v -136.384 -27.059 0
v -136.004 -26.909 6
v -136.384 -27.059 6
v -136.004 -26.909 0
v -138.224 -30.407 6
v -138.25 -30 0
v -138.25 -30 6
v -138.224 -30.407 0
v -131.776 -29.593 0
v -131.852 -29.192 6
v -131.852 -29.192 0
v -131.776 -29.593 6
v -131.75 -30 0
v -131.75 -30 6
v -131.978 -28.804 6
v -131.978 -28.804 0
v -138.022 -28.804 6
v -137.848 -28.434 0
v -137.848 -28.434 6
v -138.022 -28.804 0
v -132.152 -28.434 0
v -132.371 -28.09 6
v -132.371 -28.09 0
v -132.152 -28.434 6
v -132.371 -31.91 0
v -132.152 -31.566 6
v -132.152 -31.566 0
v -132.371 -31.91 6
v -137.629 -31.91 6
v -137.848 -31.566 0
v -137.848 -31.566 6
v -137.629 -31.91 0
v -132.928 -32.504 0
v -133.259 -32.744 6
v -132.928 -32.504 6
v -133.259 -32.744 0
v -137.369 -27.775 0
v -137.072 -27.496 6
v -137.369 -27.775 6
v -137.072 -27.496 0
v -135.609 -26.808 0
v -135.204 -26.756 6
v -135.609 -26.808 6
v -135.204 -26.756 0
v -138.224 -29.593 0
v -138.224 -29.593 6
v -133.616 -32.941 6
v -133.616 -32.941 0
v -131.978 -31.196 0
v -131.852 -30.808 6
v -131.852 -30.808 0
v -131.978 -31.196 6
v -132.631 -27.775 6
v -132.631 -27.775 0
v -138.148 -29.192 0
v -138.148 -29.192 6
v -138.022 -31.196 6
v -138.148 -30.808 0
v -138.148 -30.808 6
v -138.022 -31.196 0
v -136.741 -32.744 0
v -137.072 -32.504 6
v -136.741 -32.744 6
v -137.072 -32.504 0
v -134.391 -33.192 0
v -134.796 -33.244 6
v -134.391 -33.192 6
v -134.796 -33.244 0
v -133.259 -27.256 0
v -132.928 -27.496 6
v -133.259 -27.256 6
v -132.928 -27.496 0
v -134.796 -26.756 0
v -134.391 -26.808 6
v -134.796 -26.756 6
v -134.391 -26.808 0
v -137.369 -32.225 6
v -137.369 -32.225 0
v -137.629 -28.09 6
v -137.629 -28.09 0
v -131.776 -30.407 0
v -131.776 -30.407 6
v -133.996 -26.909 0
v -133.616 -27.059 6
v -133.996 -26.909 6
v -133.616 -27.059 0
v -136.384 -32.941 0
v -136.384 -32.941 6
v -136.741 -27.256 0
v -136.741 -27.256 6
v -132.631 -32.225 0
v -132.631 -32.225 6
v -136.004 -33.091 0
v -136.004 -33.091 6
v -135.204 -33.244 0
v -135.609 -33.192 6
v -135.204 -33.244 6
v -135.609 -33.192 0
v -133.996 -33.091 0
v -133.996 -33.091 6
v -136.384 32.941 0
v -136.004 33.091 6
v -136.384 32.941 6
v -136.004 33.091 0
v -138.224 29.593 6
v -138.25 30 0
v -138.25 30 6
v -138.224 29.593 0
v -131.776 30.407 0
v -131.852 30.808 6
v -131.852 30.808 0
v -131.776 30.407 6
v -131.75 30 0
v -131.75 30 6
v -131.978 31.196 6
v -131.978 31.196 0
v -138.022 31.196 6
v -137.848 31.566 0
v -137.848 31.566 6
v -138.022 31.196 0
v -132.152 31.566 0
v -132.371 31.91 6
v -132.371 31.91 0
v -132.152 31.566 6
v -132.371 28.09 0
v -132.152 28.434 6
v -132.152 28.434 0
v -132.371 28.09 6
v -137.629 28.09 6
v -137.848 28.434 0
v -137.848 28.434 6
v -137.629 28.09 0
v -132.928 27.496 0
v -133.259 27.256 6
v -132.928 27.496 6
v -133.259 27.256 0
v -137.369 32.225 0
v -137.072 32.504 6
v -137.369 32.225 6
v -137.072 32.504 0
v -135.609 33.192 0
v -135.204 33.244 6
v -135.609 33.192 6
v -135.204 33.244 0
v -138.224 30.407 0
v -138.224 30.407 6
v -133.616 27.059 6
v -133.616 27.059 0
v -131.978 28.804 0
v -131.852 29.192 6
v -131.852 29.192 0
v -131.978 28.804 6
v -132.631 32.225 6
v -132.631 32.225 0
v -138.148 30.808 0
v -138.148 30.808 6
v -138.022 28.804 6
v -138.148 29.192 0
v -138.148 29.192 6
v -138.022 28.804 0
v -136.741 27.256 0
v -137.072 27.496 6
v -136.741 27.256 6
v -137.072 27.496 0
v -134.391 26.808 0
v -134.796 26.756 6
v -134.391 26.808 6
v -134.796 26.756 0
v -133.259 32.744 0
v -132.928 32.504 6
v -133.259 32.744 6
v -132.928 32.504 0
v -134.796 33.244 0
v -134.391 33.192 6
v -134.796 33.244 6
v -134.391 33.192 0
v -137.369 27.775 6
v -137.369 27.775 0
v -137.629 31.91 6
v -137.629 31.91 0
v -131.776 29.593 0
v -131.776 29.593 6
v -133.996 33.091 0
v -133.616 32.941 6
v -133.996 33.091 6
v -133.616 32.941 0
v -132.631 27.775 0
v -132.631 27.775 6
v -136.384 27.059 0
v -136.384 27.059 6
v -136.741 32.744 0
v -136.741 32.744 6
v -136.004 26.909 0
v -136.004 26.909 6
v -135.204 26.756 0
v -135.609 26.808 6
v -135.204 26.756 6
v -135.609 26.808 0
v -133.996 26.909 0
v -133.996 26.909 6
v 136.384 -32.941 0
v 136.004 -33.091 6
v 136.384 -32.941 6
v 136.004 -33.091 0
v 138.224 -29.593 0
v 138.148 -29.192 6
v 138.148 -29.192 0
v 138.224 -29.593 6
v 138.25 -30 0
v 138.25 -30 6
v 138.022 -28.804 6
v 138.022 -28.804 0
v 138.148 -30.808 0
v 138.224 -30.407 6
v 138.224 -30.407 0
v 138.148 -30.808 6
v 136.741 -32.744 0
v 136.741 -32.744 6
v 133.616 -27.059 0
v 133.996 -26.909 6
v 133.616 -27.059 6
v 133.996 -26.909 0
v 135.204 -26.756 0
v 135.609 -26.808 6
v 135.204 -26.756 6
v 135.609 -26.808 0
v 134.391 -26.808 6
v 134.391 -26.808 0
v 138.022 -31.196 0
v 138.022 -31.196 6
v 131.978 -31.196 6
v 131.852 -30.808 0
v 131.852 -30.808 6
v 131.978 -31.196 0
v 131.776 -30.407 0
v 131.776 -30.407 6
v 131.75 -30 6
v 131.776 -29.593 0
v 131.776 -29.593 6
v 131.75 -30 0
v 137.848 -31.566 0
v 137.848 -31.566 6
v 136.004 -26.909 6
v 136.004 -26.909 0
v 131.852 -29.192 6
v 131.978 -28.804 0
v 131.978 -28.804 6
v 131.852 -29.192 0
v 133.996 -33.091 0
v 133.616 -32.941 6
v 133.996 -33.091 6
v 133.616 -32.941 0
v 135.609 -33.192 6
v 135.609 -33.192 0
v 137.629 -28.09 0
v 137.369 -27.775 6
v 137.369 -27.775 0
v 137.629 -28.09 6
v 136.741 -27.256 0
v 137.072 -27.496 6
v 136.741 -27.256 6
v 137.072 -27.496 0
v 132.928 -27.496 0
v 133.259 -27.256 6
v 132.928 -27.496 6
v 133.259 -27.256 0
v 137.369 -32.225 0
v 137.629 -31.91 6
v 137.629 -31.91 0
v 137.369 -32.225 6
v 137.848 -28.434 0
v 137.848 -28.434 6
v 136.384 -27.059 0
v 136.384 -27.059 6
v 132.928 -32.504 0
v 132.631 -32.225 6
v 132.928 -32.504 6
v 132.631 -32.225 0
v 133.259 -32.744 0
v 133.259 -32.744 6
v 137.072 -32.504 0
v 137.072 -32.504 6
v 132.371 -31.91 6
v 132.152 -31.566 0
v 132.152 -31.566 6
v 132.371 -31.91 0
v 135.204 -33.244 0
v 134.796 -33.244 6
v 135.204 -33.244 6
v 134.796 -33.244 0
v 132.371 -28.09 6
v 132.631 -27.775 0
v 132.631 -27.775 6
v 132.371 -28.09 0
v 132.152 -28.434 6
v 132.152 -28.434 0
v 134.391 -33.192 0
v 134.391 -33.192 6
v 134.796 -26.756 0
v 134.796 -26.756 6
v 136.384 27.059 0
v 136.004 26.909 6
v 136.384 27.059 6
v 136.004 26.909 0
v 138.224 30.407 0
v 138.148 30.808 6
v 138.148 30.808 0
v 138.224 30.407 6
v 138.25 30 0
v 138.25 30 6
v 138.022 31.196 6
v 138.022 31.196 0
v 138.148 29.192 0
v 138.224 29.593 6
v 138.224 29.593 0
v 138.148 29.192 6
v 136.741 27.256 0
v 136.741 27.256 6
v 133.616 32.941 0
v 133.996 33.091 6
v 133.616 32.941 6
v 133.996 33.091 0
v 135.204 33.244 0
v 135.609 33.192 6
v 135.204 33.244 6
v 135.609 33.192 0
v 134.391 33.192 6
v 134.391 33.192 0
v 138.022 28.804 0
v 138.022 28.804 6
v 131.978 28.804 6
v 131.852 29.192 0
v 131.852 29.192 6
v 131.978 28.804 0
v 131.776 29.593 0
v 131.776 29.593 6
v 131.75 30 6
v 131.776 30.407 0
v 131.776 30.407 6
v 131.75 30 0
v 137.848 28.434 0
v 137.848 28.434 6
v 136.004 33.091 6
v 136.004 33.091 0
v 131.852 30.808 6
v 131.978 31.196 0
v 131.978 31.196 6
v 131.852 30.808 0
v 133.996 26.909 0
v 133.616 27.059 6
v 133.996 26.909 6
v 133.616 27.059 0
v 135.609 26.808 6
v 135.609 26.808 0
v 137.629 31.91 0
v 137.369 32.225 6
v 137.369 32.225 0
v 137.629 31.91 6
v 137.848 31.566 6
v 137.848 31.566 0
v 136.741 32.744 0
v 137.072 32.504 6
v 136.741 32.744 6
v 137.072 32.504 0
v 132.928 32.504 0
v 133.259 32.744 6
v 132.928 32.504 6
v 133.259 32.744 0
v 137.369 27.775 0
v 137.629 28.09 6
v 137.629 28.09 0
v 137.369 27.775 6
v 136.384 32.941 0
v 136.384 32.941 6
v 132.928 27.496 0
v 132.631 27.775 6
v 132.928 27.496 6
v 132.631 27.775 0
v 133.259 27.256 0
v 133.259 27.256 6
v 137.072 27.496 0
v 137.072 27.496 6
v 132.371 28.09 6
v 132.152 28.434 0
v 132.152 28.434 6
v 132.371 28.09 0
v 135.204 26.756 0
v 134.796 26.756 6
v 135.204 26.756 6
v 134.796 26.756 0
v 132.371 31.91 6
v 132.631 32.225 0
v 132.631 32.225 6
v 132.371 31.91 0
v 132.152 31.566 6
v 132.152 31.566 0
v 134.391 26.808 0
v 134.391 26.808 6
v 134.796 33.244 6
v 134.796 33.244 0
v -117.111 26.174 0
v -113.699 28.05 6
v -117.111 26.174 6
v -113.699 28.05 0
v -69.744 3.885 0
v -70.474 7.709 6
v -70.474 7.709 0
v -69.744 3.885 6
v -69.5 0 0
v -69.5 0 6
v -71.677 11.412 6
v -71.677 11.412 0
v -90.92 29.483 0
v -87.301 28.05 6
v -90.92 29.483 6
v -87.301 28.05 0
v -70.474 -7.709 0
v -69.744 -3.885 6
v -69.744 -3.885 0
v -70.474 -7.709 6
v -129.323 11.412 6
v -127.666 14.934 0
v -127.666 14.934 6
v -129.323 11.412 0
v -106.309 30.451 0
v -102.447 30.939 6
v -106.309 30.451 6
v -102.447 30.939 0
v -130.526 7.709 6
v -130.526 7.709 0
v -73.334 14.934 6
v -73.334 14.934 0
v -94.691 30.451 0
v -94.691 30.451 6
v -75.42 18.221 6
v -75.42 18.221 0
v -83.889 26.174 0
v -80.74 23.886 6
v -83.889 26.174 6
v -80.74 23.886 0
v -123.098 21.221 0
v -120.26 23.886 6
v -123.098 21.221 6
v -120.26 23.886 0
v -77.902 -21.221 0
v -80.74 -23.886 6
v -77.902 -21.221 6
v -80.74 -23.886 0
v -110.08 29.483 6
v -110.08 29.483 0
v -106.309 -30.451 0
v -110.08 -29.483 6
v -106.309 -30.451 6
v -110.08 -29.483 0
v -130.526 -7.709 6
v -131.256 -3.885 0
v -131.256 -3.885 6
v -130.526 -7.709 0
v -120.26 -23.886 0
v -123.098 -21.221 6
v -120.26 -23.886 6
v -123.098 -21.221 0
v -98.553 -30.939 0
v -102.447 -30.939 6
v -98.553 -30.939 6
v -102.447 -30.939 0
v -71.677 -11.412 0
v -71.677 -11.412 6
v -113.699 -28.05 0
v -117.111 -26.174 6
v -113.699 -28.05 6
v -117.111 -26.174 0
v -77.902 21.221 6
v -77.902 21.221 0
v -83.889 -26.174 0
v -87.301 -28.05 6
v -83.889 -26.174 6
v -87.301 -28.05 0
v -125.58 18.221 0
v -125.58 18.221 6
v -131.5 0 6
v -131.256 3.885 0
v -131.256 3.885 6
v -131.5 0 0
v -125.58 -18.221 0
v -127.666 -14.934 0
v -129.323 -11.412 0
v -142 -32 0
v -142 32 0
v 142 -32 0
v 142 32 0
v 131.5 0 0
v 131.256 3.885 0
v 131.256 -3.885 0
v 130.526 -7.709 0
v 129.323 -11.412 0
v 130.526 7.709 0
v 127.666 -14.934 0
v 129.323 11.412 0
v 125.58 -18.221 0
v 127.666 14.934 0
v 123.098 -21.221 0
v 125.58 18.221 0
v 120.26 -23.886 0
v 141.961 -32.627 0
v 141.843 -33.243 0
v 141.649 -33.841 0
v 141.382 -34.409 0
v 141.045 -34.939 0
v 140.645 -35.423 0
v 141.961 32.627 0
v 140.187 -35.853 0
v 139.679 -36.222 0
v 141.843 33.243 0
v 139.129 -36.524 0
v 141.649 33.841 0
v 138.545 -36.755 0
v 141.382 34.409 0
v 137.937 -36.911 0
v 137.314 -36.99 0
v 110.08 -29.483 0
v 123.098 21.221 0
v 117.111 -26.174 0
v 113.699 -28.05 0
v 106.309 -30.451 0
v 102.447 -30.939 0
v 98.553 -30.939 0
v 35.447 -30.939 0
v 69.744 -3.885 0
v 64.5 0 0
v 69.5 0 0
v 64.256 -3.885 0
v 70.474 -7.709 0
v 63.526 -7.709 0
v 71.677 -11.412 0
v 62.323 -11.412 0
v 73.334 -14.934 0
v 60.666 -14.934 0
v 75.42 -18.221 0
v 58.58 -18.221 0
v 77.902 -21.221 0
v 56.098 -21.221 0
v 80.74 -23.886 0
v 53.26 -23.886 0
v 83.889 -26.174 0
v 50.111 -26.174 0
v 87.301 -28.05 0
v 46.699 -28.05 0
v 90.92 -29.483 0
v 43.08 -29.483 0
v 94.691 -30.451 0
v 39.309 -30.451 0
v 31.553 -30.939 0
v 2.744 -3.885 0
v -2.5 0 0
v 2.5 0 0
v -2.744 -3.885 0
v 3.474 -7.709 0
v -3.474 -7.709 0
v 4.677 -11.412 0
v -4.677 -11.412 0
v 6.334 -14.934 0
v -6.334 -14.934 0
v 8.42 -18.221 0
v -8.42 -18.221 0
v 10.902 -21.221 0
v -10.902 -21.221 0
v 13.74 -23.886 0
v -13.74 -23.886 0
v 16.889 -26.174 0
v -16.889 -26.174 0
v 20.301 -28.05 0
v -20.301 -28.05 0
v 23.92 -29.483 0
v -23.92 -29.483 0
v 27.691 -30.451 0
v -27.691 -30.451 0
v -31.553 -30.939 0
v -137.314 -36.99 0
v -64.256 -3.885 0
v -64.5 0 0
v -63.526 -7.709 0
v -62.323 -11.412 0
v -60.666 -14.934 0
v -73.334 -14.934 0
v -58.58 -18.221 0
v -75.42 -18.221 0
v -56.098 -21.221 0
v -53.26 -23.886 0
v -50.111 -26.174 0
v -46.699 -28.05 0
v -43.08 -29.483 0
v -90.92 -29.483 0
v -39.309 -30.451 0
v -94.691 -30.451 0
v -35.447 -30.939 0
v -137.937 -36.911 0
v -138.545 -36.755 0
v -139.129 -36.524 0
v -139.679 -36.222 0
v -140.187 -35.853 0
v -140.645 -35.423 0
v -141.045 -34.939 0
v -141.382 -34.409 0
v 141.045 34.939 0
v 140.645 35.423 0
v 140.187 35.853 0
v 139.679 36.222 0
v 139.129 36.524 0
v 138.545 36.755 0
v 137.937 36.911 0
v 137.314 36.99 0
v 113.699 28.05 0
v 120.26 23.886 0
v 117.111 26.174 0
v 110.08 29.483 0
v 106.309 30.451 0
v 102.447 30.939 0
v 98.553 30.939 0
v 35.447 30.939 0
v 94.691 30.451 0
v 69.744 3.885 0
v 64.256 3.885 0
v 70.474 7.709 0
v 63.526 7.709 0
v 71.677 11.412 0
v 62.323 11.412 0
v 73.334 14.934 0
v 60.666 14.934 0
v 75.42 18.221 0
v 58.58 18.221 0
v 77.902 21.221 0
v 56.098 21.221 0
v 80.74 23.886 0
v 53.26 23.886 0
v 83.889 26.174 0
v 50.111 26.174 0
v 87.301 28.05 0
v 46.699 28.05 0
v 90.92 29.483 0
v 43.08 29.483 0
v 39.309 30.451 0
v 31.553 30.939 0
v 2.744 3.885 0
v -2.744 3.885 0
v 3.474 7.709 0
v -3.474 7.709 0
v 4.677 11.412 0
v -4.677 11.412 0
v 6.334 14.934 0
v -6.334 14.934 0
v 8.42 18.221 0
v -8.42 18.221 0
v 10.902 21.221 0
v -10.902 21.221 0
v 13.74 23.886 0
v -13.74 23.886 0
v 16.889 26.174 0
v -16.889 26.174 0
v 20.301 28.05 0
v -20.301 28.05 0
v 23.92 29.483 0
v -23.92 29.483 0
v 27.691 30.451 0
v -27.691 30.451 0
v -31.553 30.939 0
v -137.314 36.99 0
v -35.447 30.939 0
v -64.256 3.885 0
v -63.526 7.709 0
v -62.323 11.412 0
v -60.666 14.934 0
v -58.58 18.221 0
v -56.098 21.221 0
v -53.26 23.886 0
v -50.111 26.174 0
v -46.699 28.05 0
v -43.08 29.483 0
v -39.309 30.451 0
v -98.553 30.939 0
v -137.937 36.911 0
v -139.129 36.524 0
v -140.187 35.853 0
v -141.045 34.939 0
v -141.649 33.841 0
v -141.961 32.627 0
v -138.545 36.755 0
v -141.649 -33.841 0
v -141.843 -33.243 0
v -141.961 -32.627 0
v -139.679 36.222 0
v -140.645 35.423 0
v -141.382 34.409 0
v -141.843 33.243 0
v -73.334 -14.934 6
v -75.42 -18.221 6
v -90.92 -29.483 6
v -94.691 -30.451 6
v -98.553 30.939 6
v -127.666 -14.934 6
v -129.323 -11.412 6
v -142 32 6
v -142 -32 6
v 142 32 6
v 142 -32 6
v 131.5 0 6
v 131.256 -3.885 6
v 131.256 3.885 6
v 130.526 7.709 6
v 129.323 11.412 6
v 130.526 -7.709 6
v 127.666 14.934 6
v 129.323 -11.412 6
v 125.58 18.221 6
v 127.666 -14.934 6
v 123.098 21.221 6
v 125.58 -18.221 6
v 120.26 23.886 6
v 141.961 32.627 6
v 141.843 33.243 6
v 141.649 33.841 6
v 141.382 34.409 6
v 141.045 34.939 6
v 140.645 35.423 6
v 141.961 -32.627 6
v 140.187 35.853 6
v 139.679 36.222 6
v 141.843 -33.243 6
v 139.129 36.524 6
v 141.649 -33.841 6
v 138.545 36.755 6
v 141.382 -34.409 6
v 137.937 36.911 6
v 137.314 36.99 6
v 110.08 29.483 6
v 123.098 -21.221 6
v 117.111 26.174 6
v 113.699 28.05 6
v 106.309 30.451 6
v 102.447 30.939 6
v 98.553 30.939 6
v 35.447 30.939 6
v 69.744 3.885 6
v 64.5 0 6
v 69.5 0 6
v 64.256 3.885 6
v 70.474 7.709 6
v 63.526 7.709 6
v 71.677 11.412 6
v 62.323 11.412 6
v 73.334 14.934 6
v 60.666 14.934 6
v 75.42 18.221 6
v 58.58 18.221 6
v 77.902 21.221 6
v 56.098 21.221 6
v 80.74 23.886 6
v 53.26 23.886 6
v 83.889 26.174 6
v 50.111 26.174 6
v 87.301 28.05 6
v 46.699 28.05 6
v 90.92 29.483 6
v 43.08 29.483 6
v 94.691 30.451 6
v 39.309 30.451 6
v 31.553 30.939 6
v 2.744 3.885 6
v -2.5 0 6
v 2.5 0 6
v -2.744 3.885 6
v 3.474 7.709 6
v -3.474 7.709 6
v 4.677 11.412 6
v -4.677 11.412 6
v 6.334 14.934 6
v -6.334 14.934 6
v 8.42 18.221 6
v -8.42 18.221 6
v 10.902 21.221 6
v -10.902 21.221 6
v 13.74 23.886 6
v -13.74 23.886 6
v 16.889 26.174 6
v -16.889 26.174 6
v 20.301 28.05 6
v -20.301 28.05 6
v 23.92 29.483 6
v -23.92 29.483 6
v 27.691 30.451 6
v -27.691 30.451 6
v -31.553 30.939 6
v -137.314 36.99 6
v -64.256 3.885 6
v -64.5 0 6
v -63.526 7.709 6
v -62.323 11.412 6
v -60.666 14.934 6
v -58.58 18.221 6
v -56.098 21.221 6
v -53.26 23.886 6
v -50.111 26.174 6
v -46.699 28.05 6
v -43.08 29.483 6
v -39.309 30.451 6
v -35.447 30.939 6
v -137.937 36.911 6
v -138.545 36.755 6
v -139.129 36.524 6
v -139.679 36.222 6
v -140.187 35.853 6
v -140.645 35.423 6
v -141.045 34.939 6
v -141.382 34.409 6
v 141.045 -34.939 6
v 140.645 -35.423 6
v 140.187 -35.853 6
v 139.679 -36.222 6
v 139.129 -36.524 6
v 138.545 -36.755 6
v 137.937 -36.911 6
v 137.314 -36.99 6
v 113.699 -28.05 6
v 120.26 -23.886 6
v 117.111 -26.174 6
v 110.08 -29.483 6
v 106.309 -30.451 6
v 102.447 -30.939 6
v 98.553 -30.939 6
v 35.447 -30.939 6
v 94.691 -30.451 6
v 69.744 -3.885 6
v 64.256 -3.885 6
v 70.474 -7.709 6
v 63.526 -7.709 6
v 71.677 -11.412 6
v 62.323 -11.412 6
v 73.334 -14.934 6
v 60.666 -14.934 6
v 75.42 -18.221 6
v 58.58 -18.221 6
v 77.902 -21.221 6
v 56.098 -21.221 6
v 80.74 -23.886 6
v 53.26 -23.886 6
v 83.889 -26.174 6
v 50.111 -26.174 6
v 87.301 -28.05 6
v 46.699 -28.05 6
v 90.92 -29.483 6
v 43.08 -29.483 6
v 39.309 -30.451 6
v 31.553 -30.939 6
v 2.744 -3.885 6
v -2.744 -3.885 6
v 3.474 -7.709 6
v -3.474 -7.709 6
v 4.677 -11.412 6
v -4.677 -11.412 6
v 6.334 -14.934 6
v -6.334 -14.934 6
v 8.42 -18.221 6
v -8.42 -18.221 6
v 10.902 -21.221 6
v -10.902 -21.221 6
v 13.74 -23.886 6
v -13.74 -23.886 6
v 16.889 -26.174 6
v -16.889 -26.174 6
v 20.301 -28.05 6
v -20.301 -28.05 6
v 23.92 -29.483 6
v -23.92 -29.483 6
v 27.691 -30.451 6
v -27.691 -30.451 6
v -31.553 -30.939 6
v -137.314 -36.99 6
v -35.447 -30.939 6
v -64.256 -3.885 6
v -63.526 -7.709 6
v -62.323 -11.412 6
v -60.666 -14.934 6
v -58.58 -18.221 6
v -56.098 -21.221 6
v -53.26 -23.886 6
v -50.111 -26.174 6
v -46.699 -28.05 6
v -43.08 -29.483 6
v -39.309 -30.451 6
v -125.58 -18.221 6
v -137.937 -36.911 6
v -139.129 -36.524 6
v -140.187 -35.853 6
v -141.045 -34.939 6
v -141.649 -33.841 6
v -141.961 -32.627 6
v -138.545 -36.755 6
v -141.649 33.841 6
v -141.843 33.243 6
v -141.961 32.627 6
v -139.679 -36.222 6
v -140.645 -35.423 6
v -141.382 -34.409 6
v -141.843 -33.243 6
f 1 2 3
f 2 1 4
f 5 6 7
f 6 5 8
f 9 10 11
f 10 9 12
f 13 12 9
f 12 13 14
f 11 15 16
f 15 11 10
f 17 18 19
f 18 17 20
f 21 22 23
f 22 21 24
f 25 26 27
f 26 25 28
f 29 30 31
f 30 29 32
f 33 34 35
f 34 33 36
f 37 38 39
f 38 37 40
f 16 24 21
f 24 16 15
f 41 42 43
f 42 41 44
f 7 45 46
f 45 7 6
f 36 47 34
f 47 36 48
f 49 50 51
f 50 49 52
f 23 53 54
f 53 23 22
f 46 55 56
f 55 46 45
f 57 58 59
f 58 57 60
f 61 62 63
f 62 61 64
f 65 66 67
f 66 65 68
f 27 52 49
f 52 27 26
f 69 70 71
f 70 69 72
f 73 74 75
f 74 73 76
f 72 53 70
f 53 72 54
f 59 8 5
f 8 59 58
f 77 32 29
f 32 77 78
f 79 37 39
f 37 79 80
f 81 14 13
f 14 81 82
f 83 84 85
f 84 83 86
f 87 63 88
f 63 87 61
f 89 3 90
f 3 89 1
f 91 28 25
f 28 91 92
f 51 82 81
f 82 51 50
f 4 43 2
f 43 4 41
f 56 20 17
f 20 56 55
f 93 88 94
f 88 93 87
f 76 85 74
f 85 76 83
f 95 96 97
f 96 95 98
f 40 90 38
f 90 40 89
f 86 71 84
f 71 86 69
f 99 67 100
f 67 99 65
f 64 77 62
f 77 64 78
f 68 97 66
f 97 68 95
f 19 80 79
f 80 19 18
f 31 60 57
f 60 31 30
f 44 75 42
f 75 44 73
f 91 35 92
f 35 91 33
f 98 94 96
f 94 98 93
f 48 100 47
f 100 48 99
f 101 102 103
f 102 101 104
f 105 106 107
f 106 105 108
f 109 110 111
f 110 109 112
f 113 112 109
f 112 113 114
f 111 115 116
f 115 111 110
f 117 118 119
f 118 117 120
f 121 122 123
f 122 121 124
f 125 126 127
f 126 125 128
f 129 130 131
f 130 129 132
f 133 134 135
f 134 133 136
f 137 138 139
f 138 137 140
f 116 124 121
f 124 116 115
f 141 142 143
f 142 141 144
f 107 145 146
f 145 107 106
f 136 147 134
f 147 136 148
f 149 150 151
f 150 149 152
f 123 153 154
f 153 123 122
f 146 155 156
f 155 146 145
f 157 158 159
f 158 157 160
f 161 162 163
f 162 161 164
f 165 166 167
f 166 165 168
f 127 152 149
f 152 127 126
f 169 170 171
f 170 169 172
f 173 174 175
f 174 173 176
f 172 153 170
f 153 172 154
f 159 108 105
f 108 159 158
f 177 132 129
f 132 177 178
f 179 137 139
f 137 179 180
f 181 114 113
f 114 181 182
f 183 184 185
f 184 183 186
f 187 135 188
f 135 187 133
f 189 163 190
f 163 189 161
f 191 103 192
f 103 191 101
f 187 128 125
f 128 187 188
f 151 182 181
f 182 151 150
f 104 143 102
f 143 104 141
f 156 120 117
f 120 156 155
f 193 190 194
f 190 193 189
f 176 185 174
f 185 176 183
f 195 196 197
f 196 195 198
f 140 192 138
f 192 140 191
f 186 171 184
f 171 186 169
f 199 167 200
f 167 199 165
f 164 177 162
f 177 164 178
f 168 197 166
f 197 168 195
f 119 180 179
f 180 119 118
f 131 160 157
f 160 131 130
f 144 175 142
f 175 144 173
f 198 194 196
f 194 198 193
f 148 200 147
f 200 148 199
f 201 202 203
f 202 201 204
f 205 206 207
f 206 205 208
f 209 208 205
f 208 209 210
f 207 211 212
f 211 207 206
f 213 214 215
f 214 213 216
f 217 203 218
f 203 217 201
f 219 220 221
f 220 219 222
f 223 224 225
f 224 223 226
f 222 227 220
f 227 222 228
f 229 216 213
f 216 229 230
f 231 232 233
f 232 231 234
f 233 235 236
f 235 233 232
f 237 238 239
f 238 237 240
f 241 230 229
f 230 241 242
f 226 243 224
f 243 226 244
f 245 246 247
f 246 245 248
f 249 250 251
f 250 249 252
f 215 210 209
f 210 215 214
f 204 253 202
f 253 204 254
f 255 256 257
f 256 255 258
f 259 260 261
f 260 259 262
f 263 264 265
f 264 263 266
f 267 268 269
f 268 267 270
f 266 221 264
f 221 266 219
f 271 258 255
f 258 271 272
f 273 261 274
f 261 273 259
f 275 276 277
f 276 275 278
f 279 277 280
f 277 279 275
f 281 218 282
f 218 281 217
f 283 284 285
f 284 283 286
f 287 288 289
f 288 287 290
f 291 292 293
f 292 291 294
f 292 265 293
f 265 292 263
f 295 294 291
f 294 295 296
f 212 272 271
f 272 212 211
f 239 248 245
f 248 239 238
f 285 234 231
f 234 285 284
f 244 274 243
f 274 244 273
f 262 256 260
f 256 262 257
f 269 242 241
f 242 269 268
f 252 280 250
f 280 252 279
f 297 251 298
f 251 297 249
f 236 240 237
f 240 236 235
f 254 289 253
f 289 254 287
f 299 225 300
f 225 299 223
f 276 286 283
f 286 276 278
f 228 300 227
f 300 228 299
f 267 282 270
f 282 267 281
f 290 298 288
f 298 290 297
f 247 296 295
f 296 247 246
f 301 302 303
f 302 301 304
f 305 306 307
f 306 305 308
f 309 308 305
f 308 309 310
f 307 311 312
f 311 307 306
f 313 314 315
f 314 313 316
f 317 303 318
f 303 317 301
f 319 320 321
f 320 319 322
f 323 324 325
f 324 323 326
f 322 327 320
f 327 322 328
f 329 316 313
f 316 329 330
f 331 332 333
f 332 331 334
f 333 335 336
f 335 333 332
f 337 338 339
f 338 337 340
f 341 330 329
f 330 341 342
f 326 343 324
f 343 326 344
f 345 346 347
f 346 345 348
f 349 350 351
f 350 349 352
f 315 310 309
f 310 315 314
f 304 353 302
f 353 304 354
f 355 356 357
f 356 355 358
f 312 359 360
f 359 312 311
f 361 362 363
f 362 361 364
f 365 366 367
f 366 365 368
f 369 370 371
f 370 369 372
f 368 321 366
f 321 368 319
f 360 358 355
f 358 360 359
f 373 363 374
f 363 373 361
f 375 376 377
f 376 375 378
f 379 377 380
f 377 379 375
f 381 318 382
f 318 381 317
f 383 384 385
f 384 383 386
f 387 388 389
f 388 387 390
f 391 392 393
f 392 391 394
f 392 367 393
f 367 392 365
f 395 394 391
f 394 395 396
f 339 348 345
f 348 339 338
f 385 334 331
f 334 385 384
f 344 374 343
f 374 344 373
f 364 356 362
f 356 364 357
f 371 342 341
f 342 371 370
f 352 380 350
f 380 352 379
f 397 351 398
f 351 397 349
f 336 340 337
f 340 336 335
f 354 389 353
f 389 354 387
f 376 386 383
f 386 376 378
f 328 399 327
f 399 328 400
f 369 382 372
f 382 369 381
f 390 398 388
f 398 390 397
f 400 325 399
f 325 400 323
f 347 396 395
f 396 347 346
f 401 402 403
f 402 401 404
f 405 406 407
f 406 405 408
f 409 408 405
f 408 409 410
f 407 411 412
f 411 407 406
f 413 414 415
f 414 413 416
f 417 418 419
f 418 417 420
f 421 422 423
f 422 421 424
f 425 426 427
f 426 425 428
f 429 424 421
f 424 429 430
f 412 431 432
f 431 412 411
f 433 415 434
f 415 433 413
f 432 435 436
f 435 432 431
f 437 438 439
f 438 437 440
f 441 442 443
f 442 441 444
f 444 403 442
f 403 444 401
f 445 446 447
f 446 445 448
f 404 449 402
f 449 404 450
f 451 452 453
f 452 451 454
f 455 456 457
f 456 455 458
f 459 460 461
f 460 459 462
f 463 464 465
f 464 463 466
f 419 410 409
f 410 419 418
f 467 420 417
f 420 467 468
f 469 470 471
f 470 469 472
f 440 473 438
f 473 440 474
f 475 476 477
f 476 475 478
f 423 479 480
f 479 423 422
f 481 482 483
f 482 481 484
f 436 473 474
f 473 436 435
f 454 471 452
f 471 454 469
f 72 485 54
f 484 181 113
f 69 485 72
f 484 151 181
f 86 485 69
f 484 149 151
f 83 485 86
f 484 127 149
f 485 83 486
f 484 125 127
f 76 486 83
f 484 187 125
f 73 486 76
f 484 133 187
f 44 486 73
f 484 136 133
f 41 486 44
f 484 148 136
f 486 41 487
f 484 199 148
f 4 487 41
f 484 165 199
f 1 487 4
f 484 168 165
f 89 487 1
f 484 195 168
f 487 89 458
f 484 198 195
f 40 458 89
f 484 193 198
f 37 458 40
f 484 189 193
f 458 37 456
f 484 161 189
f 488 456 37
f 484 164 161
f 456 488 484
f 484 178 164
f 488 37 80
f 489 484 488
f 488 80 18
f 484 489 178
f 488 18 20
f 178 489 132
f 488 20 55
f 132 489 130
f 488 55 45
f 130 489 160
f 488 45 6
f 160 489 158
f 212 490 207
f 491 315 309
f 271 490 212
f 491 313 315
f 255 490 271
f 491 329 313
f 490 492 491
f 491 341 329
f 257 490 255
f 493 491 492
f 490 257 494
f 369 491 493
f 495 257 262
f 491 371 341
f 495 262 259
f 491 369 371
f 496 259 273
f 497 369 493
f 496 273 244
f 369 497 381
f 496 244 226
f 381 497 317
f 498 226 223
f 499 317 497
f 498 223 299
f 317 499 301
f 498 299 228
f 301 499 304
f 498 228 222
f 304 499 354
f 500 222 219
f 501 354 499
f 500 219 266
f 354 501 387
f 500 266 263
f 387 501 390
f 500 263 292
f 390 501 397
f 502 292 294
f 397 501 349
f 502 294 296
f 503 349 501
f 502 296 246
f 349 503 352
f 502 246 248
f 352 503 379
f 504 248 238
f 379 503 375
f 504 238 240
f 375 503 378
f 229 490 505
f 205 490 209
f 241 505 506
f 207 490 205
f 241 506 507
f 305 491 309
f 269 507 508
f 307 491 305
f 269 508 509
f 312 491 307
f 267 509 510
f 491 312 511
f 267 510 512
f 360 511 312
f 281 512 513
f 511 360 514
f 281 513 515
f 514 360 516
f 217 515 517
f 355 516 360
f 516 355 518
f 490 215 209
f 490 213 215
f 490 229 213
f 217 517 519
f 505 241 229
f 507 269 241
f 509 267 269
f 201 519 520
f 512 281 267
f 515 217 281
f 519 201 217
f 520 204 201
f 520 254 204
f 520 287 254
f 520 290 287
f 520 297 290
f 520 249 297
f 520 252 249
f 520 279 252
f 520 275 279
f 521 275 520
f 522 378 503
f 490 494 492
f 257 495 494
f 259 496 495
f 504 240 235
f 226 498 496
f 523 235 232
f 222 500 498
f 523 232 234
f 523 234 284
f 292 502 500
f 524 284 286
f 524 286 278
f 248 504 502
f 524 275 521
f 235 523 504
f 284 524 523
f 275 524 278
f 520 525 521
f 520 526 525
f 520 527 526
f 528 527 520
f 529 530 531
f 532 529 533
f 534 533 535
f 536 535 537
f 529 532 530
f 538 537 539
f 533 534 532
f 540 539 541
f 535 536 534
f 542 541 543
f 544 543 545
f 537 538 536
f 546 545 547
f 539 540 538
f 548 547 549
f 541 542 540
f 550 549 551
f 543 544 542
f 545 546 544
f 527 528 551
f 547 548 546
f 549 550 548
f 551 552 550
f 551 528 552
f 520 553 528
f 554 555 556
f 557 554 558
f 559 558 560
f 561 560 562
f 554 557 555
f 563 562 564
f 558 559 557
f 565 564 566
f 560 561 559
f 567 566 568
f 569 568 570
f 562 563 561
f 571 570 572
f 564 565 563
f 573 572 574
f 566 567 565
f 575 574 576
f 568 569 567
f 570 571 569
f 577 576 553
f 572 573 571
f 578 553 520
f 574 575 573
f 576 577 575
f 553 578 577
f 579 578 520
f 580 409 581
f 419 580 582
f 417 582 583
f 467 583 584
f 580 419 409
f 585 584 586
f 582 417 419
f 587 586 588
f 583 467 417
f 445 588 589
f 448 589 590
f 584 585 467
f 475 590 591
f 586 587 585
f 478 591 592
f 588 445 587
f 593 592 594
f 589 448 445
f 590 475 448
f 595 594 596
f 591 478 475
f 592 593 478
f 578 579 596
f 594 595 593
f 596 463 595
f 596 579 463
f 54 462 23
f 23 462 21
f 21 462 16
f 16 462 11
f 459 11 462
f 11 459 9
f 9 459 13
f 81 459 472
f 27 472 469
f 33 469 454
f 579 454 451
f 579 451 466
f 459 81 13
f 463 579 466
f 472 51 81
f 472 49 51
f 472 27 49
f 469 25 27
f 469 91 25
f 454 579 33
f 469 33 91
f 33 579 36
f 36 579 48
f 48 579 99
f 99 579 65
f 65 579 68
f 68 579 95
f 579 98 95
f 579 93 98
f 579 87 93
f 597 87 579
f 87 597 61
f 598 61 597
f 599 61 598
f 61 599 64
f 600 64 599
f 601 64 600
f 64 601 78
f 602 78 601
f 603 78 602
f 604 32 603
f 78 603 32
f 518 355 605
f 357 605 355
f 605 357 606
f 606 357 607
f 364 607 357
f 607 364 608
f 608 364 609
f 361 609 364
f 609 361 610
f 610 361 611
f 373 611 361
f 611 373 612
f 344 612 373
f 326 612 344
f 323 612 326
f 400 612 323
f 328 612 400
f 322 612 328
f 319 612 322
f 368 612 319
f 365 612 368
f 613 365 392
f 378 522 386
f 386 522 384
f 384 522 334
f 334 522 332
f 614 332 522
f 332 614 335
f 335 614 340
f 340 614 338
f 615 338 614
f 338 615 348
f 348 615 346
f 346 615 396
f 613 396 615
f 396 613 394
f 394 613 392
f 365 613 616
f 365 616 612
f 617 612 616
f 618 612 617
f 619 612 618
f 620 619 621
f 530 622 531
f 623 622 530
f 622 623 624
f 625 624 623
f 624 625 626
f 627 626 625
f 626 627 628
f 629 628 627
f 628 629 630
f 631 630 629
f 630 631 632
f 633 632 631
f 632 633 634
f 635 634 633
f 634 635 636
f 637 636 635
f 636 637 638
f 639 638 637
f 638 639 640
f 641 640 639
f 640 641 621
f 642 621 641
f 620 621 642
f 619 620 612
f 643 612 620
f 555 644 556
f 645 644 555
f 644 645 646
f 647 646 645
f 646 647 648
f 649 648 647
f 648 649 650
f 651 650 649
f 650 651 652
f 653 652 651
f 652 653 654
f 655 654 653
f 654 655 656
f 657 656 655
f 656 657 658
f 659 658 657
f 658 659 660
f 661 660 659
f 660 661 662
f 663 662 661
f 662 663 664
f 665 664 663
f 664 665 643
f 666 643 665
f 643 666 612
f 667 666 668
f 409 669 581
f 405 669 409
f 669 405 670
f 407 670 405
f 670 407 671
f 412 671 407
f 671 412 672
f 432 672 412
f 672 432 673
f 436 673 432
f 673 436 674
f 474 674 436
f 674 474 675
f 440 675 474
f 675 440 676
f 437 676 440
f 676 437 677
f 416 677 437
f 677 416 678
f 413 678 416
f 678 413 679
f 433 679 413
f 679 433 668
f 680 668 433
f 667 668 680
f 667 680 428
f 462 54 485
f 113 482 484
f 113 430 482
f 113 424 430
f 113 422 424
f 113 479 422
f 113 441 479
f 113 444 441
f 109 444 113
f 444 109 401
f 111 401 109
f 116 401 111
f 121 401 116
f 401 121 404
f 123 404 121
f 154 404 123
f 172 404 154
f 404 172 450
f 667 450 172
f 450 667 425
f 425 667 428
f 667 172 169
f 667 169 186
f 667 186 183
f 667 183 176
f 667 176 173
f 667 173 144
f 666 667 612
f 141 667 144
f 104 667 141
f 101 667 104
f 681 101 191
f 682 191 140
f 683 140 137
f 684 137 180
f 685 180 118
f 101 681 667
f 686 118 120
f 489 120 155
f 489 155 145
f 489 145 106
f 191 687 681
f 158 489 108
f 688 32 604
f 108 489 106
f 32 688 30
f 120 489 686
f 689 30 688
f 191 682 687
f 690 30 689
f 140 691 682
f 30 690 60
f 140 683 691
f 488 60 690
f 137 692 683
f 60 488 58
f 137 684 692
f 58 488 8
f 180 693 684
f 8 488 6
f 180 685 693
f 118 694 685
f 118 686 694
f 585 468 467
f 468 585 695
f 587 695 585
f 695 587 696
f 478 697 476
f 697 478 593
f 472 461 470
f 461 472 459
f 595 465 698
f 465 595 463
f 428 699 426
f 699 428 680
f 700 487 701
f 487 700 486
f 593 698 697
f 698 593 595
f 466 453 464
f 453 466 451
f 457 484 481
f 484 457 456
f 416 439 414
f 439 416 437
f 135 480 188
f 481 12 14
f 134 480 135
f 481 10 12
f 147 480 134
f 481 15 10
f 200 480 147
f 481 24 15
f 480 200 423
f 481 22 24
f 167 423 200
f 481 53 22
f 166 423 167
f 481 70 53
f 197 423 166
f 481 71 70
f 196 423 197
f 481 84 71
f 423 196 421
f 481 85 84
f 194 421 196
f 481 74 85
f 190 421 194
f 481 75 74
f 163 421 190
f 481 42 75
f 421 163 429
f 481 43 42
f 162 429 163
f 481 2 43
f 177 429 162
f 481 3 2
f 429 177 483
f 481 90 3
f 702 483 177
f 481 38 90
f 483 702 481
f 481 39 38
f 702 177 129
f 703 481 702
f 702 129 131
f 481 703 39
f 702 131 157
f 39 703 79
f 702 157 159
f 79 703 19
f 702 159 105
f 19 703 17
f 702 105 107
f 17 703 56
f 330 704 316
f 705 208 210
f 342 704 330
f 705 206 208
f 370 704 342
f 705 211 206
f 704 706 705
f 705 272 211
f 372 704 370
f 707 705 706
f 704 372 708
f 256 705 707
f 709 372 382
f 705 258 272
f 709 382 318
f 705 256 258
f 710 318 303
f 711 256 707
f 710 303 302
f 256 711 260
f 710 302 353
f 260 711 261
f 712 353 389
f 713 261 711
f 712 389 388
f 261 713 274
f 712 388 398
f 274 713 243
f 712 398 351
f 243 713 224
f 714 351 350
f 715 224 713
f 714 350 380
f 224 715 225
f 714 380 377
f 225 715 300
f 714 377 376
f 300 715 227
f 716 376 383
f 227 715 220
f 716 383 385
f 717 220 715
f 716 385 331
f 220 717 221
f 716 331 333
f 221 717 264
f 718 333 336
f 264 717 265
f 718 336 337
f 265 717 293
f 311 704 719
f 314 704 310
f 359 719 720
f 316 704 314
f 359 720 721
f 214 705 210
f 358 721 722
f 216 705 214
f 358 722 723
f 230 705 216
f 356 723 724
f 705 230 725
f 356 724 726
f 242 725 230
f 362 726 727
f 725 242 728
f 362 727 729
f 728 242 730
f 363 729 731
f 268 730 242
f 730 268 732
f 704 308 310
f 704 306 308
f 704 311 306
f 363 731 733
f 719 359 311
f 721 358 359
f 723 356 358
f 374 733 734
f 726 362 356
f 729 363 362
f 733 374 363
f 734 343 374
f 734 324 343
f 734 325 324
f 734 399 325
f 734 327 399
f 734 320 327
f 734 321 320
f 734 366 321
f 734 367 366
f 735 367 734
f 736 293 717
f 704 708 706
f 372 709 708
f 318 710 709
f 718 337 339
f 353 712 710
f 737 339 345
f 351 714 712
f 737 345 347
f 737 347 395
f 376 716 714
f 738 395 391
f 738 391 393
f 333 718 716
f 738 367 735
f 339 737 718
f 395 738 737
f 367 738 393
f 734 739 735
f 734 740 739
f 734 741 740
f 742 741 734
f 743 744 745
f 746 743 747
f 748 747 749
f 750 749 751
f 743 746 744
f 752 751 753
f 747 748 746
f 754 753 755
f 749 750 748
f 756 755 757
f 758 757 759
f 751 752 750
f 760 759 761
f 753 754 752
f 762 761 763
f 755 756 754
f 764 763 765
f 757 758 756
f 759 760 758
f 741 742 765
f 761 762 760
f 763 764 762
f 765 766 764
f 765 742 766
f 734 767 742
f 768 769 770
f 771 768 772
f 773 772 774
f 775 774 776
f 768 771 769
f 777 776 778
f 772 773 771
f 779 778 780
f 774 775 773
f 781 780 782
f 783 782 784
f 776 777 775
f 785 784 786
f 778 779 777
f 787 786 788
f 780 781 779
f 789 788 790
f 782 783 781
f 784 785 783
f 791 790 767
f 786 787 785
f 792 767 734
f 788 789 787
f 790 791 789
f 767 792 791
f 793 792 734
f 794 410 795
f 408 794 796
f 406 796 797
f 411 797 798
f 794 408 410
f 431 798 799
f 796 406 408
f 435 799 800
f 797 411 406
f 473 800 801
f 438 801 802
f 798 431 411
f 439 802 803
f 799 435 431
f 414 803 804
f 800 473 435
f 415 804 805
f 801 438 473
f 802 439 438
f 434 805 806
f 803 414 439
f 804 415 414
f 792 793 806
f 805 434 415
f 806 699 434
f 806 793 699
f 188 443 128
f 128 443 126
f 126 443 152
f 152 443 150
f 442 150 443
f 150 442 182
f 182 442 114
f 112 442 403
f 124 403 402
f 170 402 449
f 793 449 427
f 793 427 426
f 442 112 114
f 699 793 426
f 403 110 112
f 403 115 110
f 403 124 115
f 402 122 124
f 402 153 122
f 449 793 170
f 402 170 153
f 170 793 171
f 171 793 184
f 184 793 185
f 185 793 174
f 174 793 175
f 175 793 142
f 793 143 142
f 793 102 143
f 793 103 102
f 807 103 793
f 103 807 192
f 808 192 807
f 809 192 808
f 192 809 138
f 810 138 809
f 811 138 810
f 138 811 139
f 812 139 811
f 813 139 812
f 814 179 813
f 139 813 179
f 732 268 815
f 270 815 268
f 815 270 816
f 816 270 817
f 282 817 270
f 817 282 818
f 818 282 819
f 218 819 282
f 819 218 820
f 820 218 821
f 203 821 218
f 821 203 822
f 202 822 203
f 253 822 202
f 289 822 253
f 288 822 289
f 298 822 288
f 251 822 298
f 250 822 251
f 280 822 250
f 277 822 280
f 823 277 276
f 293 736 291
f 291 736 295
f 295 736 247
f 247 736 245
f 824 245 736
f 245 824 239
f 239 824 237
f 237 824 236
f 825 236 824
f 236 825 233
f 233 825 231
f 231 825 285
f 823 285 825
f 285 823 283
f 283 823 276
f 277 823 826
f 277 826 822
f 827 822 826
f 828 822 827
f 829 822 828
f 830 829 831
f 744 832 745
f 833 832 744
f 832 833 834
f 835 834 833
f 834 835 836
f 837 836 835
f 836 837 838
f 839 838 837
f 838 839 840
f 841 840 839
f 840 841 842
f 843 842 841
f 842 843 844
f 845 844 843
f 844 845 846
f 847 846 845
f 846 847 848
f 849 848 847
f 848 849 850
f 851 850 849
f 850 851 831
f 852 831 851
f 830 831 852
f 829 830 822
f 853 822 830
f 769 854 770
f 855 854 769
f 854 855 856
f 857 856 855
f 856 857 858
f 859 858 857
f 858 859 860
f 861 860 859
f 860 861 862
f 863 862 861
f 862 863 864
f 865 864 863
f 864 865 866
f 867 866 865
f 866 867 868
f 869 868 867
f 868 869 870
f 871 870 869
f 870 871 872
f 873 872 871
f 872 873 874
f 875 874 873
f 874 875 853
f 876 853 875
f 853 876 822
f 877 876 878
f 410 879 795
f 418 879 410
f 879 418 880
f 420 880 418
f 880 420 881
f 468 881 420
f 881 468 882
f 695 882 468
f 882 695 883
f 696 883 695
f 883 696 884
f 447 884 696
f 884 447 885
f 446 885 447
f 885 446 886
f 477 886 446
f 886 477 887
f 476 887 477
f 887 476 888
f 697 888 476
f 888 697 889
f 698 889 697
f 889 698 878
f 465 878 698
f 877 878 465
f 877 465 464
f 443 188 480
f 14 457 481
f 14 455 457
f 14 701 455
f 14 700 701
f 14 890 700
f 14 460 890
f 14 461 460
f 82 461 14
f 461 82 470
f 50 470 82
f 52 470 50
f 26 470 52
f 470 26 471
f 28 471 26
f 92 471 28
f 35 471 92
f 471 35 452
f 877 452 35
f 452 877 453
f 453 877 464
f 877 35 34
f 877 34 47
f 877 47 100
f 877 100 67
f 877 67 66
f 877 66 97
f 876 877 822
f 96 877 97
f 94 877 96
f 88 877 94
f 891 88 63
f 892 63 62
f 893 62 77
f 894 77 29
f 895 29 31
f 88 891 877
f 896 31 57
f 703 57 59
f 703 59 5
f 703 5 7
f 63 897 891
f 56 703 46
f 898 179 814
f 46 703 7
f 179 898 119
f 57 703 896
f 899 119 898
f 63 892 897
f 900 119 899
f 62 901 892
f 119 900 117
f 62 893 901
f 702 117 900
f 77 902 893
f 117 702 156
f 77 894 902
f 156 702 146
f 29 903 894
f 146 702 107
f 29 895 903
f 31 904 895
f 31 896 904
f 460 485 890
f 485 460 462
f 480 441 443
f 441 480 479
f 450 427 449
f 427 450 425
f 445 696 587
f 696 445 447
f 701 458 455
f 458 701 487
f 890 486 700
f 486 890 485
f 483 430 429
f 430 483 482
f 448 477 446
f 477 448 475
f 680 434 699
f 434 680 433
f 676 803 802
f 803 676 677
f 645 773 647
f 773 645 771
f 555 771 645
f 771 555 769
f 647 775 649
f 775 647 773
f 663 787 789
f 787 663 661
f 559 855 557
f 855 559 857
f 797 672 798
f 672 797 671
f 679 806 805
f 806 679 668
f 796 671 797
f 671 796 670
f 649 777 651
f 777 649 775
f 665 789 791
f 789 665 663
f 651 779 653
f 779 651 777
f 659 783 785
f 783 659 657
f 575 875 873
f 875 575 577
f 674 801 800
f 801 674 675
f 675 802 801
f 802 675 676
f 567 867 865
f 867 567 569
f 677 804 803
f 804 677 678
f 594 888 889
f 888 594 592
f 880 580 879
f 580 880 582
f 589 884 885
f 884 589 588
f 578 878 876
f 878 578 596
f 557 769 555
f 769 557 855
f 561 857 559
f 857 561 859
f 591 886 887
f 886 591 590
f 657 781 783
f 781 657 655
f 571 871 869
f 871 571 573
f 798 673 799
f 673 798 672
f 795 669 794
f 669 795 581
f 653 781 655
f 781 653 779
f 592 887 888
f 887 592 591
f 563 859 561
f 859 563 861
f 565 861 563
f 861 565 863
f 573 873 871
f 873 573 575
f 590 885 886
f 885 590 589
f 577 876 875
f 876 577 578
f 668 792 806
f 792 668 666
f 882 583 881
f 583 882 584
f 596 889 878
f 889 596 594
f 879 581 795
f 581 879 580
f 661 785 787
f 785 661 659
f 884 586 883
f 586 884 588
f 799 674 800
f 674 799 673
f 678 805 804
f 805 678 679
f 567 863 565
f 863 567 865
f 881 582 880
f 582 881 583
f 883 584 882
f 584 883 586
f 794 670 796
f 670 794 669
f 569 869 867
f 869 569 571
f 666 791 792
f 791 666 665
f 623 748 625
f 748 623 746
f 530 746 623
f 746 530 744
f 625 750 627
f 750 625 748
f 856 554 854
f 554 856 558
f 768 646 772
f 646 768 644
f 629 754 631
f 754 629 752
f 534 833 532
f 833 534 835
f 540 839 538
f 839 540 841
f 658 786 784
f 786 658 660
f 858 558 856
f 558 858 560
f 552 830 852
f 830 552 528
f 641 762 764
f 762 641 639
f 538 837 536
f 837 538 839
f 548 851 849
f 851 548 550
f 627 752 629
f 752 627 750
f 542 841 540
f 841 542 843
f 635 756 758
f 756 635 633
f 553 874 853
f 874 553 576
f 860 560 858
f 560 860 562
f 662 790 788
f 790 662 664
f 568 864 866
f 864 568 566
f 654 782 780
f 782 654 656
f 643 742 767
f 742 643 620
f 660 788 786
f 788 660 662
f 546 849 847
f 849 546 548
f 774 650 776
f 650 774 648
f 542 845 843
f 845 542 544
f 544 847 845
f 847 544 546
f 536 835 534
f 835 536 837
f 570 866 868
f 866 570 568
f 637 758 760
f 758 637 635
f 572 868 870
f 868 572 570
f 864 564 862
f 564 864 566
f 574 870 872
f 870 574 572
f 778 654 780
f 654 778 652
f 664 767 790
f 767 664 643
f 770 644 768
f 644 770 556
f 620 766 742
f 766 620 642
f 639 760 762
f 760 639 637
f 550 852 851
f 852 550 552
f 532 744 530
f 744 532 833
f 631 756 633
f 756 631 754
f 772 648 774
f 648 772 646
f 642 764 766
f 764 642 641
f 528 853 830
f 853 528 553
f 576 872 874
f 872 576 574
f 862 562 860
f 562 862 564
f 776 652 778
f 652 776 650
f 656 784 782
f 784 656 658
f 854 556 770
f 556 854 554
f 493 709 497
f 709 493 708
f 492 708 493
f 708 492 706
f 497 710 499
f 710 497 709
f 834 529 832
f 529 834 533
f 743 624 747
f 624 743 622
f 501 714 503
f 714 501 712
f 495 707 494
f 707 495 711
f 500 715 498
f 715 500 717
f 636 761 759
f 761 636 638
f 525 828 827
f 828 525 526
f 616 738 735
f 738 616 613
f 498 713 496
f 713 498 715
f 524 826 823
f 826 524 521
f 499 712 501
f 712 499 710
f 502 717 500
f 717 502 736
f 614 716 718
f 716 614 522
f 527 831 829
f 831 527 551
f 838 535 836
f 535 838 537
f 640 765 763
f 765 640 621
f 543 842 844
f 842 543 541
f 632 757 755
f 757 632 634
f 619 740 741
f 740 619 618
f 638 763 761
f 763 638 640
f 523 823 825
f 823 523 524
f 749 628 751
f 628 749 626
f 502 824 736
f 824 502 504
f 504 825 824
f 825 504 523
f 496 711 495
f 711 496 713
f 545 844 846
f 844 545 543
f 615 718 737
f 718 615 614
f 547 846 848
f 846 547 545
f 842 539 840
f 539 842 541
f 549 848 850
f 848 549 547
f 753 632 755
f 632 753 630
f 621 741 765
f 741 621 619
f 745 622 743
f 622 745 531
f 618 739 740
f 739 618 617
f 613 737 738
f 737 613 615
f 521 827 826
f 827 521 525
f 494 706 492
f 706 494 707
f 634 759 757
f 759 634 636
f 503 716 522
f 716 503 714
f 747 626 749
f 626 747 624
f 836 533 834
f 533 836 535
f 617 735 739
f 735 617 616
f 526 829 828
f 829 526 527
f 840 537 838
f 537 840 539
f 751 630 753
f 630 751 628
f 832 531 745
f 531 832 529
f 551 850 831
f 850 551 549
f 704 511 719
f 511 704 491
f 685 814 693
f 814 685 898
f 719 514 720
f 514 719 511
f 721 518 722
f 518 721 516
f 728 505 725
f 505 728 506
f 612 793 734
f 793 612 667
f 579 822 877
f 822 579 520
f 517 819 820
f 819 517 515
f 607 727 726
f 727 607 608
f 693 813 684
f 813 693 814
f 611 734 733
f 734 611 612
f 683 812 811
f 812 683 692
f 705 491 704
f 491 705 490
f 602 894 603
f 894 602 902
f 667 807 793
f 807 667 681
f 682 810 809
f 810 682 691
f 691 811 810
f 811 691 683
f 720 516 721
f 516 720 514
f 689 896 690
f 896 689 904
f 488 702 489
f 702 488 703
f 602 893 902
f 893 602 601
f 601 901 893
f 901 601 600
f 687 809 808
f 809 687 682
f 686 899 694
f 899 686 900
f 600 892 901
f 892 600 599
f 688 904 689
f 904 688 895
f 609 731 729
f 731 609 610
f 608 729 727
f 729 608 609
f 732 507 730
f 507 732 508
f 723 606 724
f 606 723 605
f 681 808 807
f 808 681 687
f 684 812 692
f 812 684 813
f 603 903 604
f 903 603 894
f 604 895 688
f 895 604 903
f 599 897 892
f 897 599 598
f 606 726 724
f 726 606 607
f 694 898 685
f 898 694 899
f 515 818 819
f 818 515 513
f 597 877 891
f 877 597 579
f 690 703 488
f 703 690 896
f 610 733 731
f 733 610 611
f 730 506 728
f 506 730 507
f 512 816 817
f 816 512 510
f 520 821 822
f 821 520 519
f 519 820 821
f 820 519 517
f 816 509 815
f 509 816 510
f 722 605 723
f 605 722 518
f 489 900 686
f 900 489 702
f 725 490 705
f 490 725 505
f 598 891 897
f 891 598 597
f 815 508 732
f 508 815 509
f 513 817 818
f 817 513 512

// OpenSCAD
$fn = 50;


difference() {
	union() {
		hull() {
			translate(v = [-137.0000000000, 32.0000000000, 0]) {
				cylinder(h = 6, r = 5);
			}
			translate(v = [137.0000000000, 32.0000000000, 0]) {
				cylinder(h = 6, r = 5);
			}
			translate(v = [-137.0000000000, -32.0000000000, 0]) {
				cylinder(h = 6, r = 5);
			}
			translate(v = [137.0000000000, -32.0000000000, 0]) {
				cylinder(h = 6, r = 5);
			}
		}
	}
	union() {
		#translate(v = [-135.0000000000, -30.0000000000, -100.0000000000]) {
			cylinder(h = 200, r = 3.2500000000);
		}
		#translate(v = [-135.0000000000, 30.0000000000, -100.0000000000]) {
			cylinder(h = 200, r = 3.2500000000);
		}
		#translate(v = [135.0000000000, -30.0000000000, -100.0000000000]) {
			cylinder(h = 200, r = 3.2500000000);
		}
		#translate(v = [135.0000000000, 30.0000000000, -100.0000000000]) {
			cylinder(h = 200, r = 3.2500000000);
		}
		#translate(v = [-100.5000000000, 0, 0]) {
			cylinder(h = 6, r = 31.0000000000);
		}
		#translate(v = [-33.5000000000, 0, 0]) {
			cylinder(h = 6, r = 31.0000000000);
		}
		#translate(v = [33.5000000000, 0, 0]) {
			cylinder(h = 6, r = 31.0000000000);
		}
		#translate(v = [100.5000000000, 0, 0]) {
			cylinder(h = 6, r = 31.0000000000);
		}
	}
}
